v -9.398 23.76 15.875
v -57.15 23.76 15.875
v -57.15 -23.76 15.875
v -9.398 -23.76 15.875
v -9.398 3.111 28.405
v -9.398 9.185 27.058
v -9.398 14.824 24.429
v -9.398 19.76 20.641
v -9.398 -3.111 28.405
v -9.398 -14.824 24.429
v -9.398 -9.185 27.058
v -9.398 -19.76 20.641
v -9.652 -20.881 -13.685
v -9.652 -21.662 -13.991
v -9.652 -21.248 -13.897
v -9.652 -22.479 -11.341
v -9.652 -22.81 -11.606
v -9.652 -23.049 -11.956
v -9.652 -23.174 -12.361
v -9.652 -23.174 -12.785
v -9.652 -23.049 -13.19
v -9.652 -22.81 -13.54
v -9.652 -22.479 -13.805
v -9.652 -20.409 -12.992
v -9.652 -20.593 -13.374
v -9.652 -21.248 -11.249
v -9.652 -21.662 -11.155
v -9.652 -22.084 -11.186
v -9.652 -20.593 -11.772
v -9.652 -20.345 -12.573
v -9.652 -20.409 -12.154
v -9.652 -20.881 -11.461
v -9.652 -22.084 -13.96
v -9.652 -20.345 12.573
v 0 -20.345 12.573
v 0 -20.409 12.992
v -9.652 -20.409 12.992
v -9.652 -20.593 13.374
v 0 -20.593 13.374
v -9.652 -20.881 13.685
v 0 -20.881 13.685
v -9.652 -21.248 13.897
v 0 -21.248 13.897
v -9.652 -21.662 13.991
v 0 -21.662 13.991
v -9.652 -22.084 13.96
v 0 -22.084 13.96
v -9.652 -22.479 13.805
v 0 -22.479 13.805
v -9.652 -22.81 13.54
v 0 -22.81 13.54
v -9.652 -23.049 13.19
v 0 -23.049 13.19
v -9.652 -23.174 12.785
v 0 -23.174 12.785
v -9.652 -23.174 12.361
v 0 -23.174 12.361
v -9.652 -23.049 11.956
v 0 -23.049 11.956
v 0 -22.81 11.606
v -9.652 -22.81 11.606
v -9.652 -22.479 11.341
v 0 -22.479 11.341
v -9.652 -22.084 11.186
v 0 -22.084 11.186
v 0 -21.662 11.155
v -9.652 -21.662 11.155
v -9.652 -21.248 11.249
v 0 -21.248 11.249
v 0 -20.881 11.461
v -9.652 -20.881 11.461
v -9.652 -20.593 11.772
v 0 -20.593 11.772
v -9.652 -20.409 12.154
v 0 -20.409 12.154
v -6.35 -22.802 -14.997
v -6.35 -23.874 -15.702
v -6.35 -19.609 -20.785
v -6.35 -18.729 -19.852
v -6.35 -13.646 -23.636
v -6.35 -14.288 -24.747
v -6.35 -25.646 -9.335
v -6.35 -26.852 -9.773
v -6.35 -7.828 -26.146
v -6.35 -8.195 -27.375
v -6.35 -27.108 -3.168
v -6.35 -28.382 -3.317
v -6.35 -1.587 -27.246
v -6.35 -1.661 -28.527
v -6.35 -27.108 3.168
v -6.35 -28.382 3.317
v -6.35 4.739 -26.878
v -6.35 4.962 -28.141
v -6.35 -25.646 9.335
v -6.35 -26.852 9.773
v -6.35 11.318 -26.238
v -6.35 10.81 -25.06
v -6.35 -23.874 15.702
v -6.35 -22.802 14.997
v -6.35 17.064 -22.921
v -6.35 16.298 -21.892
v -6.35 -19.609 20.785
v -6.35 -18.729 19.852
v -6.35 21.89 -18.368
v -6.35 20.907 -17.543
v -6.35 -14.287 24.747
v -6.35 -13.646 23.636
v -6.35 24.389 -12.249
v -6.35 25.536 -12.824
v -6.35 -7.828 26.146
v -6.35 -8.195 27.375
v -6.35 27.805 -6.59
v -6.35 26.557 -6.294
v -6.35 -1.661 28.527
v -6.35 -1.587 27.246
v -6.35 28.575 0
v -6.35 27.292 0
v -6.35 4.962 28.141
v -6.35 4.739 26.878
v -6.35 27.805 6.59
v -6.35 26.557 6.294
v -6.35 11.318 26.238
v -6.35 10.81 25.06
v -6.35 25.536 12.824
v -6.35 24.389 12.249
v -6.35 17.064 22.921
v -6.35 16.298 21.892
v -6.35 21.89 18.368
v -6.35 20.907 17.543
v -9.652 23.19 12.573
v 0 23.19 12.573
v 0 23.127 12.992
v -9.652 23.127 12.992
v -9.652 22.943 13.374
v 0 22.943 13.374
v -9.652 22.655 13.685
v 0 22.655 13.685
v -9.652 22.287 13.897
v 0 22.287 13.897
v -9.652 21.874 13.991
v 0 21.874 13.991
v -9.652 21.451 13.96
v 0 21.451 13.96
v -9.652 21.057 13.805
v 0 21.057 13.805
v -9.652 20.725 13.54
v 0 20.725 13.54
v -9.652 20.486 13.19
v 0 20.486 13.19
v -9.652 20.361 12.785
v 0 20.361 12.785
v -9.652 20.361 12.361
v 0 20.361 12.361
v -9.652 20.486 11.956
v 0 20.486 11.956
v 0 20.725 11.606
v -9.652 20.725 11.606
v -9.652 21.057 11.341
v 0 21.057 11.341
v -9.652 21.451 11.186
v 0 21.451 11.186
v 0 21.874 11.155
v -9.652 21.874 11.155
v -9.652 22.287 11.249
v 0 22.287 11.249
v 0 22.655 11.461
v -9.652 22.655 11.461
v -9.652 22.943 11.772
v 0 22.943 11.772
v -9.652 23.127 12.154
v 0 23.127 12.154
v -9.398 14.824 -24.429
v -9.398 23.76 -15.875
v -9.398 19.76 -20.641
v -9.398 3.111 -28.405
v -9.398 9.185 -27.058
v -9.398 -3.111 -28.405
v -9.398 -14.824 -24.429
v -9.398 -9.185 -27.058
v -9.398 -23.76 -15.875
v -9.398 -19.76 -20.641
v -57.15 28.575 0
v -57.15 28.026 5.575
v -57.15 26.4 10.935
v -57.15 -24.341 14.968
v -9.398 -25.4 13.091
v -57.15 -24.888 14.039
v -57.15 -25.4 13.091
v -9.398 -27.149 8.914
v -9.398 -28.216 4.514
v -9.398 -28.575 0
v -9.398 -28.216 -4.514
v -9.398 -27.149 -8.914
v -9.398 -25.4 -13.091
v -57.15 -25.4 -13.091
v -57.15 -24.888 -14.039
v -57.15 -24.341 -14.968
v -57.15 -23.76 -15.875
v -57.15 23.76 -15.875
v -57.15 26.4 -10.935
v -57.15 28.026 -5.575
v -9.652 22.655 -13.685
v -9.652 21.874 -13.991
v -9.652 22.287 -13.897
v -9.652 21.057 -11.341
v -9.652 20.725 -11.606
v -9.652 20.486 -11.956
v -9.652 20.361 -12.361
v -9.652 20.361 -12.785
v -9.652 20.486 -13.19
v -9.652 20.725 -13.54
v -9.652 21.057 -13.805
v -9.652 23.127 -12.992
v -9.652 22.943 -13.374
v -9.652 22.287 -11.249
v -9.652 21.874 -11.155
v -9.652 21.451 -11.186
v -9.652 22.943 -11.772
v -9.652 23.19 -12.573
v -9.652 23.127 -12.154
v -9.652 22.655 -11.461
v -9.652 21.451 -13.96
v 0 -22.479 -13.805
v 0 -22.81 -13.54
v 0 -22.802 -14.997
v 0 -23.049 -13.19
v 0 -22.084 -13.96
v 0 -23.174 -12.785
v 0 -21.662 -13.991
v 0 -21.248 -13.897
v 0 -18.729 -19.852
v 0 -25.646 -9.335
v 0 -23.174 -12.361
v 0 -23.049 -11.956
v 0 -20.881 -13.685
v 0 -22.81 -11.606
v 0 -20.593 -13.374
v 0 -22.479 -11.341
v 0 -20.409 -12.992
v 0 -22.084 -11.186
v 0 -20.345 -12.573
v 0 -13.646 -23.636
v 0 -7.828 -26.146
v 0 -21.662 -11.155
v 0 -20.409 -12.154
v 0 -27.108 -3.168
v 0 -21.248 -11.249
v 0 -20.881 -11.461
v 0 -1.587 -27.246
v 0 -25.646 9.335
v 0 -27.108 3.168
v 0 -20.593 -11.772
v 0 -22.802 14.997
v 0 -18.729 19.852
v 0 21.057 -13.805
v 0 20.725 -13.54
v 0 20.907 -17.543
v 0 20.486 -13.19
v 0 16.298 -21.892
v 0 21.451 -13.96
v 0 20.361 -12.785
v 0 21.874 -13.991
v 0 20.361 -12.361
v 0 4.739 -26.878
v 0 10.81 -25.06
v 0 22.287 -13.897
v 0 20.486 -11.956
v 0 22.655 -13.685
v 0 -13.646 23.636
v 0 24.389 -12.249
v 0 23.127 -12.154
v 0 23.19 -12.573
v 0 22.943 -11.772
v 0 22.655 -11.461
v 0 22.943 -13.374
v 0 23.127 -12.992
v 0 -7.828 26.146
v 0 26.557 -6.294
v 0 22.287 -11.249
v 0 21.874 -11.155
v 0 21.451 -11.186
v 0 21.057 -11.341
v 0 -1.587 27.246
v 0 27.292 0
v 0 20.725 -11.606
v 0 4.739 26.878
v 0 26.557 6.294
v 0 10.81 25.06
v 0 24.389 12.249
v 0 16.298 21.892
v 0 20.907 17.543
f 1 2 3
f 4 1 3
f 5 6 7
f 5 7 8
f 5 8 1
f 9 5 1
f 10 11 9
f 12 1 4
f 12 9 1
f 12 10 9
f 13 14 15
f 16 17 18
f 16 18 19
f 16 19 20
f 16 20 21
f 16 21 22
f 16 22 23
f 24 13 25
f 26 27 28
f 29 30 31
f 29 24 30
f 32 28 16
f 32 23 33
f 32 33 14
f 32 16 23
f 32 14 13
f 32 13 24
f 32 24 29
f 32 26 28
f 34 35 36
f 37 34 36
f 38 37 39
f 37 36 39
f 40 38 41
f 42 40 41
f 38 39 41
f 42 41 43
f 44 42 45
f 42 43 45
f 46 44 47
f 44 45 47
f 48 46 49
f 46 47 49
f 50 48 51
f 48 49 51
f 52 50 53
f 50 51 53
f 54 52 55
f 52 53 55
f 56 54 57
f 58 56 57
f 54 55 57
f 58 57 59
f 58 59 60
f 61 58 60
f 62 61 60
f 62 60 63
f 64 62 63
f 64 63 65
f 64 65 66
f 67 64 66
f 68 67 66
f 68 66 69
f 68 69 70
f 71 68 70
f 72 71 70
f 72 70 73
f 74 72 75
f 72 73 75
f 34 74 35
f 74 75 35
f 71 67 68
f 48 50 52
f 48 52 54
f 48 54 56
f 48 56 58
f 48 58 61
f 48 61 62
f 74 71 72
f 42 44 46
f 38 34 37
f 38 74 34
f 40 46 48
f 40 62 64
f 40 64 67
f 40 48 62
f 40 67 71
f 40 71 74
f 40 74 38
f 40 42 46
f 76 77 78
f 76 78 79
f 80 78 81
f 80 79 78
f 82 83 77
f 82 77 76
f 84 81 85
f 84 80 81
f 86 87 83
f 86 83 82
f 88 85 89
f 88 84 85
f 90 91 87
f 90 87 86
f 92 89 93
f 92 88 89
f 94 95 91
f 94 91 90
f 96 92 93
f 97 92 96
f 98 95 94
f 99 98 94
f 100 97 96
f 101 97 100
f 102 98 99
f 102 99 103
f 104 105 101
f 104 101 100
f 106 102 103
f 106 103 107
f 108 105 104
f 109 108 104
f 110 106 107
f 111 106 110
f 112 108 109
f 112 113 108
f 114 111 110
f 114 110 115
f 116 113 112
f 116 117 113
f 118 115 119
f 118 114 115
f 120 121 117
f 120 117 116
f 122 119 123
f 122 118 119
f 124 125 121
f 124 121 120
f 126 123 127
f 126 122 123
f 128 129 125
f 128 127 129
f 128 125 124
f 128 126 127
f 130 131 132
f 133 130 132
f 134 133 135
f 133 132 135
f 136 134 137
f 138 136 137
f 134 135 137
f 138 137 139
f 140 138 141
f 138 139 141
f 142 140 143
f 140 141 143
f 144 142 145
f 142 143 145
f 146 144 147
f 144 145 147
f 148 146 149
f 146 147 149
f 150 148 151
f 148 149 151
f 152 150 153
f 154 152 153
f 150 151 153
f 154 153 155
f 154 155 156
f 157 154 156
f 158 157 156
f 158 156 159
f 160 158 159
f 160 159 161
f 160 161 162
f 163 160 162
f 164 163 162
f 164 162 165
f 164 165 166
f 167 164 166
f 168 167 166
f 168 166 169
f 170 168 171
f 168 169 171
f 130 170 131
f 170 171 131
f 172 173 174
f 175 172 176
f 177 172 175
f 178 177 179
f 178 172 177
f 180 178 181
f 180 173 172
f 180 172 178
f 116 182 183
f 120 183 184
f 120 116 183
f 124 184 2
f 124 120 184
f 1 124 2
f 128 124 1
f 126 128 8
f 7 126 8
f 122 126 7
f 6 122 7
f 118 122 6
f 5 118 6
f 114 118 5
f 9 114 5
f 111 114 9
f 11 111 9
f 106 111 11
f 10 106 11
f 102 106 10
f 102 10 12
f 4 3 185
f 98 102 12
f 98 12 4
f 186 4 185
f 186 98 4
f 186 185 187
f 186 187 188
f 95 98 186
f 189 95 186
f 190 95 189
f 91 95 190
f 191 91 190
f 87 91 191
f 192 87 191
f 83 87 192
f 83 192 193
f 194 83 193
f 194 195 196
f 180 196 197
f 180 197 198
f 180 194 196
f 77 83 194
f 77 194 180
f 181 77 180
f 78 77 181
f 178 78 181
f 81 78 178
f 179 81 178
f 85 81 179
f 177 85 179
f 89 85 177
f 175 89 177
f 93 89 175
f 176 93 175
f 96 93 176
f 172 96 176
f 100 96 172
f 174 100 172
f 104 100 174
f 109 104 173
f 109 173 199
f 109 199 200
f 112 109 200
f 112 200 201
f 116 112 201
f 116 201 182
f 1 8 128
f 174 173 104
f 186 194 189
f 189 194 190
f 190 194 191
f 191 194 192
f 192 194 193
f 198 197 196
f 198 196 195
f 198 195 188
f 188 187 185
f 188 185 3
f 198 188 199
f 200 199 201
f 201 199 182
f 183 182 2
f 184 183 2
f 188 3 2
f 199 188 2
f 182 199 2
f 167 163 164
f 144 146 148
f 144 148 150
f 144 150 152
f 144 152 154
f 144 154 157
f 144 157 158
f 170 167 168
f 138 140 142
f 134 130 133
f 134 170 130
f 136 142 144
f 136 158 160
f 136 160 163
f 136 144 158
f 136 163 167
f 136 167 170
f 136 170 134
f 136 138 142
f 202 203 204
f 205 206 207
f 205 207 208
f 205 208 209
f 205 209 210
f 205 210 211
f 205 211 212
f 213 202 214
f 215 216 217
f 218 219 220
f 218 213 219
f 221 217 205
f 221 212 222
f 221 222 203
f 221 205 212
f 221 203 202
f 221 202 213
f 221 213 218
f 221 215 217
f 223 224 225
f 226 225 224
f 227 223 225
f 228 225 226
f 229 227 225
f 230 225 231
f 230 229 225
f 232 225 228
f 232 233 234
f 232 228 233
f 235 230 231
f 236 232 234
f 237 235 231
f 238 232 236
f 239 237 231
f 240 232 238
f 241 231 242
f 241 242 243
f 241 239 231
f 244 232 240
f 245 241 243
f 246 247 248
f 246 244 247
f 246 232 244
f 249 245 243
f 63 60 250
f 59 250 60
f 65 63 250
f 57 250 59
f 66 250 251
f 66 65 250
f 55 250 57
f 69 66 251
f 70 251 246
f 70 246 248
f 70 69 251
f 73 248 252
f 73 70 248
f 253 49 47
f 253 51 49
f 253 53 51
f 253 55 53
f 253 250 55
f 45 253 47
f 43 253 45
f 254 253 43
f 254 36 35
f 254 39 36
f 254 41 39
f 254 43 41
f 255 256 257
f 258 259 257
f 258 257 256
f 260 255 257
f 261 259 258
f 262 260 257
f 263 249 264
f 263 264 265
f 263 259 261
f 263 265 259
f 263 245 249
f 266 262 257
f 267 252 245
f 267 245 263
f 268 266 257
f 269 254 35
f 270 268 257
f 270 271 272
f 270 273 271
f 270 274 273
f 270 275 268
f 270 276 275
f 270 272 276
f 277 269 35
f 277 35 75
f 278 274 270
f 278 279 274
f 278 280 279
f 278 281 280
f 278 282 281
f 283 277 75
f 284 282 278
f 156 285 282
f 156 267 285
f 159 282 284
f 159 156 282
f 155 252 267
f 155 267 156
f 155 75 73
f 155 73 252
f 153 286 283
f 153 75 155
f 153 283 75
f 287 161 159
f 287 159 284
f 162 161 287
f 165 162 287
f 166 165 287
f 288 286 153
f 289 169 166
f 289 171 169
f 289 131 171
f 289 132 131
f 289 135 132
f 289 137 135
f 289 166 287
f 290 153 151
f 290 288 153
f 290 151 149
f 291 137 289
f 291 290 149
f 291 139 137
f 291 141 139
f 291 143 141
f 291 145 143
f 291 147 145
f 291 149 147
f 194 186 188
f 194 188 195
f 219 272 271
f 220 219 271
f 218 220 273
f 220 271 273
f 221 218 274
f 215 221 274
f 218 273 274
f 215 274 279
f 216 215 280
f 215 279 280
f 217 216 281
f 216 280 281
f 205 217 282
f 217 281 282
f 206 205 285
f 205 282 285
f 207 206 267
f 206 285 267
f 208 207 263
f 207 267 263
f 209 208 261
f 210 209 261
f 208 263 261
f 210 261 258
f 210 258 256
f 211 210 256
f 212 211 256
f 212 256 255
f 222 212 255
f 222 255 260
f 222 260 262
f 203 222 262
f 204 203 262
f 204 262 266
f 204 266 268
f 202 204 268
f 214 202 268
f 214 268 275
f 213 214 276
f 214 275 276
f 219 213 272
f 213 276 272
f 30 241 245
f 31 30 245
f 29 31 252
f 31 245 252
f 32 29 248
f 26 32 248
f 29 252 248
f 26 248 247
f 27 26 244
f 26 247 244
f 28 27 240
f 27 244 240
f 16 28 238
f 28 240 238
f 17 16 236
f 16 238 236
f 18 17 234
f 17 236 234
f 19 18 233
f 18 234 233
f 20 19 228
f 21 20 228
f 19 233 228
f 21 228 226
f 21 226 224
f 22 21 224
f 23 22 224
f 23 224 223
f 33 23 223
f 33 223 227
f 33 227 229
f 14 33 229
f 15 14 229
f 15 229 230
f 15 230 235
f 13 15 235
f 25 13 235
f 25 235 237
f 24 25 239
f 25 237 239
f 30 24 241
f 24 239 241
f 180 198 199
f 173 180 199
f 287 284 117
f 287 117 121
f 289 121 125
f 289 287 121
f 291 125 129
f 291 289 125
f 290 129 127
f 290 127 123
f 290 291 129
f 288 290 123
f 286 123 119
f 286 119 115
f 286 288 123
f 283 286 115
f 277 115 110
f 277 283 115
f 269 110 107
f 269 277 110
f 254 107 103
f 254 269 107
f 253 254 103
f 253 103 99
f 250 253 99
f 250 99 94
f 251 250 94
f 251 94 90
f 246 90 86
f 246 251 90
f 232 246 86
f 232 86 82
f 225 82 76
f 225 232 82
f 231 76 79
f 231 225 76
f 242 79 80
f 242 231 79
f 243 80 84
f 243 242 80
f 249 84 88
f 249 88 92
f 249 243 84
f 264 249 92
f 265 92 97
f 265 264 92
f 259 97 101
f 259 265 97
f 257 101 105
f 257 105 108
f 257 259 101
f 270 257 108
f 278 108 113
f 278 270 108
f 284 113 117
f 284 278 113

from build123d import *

# Parameters (mm, degrees)
F0_R     = 28.575
F0_R_2   = 27.2923
F1_DEPTH = 57.15
F2_DEPTH = 6.35
F4_DEPTH = 47.752
F5_R     = 1.4224
F6_DEPTH = 9.652


with BuildPart() as f1:
    # F0 (on Right) → F1 (new body)
    with BuildSketch(Plane.YZ):
        Circle(F0_R)
        Circle(F0_R_2, mode=Mode.SUBTRACT)
        Circle(F0_R_2)
    extrude(amount=-F1_DEPTH)

    # F0 (on Right) → F2 (cut)
    with BuildSketch(Plane.YZ):
        Circle(F0_R)
        Circle(F0_R_2, mode=Mode.SUBTRACT)
    extrude(amount=-F2_DEPTH, mode=Mode.SUBTRACT)

    # F3 (on face) → F4 (cut)
    with BuildSketch(Plane(origin=(-57.15, 0, 0), x_dir=(0, -1, 0), z_dir=(-1, 0, 0))):
        with BuildLine():
            ThreePointArc((-23.759524406, -15.875), (0, -28.575), (23.759524406, -15.875))
            Line((23.759524406, -15.875), (-23.759524406, -15.875))
        make_face()
        with BuildLine():
            Line((25.4, 13.0908603613), (25.4, -13.0908603613))
            ThreePointArc((25.4, -13.0908603613), (27.7699083992, -6.7351920908), (28.575, 0))
            ThreePointArc((28.575, 0), (27.7699083992, 6.7351920908), (25.4, 13.0908603613))
        make_face()
        with BuildLine():
            Line((-23.759524406, 15.875), (23.759524406, 15.875))
            ThreePointArc((23.759524406, 15.875), (0, 28.575), (-23.759524406, 15.875))
        make_face()
    extrude(amount=-F4_DEPTH, mode=Mode.SUBTRACT)

    # F5 (on face) → F6 (cut)
    with BuildSketch(Plane.YZ):
        with Locations((-21.7678, 12.573)):
            Circle(F5_R)
        with Locations((21.7678, 12.573)):
            Circle(F5_R)
        with Locations((21.7678, -12.573)):
            Circle(F5_R)
        with Locations((-21.7678, -12.573)):
            Circle(F5_R)
    extrude(amount=-F6_DEPTH, mode=Mode.SUBTRACT)


solid = f1.part
